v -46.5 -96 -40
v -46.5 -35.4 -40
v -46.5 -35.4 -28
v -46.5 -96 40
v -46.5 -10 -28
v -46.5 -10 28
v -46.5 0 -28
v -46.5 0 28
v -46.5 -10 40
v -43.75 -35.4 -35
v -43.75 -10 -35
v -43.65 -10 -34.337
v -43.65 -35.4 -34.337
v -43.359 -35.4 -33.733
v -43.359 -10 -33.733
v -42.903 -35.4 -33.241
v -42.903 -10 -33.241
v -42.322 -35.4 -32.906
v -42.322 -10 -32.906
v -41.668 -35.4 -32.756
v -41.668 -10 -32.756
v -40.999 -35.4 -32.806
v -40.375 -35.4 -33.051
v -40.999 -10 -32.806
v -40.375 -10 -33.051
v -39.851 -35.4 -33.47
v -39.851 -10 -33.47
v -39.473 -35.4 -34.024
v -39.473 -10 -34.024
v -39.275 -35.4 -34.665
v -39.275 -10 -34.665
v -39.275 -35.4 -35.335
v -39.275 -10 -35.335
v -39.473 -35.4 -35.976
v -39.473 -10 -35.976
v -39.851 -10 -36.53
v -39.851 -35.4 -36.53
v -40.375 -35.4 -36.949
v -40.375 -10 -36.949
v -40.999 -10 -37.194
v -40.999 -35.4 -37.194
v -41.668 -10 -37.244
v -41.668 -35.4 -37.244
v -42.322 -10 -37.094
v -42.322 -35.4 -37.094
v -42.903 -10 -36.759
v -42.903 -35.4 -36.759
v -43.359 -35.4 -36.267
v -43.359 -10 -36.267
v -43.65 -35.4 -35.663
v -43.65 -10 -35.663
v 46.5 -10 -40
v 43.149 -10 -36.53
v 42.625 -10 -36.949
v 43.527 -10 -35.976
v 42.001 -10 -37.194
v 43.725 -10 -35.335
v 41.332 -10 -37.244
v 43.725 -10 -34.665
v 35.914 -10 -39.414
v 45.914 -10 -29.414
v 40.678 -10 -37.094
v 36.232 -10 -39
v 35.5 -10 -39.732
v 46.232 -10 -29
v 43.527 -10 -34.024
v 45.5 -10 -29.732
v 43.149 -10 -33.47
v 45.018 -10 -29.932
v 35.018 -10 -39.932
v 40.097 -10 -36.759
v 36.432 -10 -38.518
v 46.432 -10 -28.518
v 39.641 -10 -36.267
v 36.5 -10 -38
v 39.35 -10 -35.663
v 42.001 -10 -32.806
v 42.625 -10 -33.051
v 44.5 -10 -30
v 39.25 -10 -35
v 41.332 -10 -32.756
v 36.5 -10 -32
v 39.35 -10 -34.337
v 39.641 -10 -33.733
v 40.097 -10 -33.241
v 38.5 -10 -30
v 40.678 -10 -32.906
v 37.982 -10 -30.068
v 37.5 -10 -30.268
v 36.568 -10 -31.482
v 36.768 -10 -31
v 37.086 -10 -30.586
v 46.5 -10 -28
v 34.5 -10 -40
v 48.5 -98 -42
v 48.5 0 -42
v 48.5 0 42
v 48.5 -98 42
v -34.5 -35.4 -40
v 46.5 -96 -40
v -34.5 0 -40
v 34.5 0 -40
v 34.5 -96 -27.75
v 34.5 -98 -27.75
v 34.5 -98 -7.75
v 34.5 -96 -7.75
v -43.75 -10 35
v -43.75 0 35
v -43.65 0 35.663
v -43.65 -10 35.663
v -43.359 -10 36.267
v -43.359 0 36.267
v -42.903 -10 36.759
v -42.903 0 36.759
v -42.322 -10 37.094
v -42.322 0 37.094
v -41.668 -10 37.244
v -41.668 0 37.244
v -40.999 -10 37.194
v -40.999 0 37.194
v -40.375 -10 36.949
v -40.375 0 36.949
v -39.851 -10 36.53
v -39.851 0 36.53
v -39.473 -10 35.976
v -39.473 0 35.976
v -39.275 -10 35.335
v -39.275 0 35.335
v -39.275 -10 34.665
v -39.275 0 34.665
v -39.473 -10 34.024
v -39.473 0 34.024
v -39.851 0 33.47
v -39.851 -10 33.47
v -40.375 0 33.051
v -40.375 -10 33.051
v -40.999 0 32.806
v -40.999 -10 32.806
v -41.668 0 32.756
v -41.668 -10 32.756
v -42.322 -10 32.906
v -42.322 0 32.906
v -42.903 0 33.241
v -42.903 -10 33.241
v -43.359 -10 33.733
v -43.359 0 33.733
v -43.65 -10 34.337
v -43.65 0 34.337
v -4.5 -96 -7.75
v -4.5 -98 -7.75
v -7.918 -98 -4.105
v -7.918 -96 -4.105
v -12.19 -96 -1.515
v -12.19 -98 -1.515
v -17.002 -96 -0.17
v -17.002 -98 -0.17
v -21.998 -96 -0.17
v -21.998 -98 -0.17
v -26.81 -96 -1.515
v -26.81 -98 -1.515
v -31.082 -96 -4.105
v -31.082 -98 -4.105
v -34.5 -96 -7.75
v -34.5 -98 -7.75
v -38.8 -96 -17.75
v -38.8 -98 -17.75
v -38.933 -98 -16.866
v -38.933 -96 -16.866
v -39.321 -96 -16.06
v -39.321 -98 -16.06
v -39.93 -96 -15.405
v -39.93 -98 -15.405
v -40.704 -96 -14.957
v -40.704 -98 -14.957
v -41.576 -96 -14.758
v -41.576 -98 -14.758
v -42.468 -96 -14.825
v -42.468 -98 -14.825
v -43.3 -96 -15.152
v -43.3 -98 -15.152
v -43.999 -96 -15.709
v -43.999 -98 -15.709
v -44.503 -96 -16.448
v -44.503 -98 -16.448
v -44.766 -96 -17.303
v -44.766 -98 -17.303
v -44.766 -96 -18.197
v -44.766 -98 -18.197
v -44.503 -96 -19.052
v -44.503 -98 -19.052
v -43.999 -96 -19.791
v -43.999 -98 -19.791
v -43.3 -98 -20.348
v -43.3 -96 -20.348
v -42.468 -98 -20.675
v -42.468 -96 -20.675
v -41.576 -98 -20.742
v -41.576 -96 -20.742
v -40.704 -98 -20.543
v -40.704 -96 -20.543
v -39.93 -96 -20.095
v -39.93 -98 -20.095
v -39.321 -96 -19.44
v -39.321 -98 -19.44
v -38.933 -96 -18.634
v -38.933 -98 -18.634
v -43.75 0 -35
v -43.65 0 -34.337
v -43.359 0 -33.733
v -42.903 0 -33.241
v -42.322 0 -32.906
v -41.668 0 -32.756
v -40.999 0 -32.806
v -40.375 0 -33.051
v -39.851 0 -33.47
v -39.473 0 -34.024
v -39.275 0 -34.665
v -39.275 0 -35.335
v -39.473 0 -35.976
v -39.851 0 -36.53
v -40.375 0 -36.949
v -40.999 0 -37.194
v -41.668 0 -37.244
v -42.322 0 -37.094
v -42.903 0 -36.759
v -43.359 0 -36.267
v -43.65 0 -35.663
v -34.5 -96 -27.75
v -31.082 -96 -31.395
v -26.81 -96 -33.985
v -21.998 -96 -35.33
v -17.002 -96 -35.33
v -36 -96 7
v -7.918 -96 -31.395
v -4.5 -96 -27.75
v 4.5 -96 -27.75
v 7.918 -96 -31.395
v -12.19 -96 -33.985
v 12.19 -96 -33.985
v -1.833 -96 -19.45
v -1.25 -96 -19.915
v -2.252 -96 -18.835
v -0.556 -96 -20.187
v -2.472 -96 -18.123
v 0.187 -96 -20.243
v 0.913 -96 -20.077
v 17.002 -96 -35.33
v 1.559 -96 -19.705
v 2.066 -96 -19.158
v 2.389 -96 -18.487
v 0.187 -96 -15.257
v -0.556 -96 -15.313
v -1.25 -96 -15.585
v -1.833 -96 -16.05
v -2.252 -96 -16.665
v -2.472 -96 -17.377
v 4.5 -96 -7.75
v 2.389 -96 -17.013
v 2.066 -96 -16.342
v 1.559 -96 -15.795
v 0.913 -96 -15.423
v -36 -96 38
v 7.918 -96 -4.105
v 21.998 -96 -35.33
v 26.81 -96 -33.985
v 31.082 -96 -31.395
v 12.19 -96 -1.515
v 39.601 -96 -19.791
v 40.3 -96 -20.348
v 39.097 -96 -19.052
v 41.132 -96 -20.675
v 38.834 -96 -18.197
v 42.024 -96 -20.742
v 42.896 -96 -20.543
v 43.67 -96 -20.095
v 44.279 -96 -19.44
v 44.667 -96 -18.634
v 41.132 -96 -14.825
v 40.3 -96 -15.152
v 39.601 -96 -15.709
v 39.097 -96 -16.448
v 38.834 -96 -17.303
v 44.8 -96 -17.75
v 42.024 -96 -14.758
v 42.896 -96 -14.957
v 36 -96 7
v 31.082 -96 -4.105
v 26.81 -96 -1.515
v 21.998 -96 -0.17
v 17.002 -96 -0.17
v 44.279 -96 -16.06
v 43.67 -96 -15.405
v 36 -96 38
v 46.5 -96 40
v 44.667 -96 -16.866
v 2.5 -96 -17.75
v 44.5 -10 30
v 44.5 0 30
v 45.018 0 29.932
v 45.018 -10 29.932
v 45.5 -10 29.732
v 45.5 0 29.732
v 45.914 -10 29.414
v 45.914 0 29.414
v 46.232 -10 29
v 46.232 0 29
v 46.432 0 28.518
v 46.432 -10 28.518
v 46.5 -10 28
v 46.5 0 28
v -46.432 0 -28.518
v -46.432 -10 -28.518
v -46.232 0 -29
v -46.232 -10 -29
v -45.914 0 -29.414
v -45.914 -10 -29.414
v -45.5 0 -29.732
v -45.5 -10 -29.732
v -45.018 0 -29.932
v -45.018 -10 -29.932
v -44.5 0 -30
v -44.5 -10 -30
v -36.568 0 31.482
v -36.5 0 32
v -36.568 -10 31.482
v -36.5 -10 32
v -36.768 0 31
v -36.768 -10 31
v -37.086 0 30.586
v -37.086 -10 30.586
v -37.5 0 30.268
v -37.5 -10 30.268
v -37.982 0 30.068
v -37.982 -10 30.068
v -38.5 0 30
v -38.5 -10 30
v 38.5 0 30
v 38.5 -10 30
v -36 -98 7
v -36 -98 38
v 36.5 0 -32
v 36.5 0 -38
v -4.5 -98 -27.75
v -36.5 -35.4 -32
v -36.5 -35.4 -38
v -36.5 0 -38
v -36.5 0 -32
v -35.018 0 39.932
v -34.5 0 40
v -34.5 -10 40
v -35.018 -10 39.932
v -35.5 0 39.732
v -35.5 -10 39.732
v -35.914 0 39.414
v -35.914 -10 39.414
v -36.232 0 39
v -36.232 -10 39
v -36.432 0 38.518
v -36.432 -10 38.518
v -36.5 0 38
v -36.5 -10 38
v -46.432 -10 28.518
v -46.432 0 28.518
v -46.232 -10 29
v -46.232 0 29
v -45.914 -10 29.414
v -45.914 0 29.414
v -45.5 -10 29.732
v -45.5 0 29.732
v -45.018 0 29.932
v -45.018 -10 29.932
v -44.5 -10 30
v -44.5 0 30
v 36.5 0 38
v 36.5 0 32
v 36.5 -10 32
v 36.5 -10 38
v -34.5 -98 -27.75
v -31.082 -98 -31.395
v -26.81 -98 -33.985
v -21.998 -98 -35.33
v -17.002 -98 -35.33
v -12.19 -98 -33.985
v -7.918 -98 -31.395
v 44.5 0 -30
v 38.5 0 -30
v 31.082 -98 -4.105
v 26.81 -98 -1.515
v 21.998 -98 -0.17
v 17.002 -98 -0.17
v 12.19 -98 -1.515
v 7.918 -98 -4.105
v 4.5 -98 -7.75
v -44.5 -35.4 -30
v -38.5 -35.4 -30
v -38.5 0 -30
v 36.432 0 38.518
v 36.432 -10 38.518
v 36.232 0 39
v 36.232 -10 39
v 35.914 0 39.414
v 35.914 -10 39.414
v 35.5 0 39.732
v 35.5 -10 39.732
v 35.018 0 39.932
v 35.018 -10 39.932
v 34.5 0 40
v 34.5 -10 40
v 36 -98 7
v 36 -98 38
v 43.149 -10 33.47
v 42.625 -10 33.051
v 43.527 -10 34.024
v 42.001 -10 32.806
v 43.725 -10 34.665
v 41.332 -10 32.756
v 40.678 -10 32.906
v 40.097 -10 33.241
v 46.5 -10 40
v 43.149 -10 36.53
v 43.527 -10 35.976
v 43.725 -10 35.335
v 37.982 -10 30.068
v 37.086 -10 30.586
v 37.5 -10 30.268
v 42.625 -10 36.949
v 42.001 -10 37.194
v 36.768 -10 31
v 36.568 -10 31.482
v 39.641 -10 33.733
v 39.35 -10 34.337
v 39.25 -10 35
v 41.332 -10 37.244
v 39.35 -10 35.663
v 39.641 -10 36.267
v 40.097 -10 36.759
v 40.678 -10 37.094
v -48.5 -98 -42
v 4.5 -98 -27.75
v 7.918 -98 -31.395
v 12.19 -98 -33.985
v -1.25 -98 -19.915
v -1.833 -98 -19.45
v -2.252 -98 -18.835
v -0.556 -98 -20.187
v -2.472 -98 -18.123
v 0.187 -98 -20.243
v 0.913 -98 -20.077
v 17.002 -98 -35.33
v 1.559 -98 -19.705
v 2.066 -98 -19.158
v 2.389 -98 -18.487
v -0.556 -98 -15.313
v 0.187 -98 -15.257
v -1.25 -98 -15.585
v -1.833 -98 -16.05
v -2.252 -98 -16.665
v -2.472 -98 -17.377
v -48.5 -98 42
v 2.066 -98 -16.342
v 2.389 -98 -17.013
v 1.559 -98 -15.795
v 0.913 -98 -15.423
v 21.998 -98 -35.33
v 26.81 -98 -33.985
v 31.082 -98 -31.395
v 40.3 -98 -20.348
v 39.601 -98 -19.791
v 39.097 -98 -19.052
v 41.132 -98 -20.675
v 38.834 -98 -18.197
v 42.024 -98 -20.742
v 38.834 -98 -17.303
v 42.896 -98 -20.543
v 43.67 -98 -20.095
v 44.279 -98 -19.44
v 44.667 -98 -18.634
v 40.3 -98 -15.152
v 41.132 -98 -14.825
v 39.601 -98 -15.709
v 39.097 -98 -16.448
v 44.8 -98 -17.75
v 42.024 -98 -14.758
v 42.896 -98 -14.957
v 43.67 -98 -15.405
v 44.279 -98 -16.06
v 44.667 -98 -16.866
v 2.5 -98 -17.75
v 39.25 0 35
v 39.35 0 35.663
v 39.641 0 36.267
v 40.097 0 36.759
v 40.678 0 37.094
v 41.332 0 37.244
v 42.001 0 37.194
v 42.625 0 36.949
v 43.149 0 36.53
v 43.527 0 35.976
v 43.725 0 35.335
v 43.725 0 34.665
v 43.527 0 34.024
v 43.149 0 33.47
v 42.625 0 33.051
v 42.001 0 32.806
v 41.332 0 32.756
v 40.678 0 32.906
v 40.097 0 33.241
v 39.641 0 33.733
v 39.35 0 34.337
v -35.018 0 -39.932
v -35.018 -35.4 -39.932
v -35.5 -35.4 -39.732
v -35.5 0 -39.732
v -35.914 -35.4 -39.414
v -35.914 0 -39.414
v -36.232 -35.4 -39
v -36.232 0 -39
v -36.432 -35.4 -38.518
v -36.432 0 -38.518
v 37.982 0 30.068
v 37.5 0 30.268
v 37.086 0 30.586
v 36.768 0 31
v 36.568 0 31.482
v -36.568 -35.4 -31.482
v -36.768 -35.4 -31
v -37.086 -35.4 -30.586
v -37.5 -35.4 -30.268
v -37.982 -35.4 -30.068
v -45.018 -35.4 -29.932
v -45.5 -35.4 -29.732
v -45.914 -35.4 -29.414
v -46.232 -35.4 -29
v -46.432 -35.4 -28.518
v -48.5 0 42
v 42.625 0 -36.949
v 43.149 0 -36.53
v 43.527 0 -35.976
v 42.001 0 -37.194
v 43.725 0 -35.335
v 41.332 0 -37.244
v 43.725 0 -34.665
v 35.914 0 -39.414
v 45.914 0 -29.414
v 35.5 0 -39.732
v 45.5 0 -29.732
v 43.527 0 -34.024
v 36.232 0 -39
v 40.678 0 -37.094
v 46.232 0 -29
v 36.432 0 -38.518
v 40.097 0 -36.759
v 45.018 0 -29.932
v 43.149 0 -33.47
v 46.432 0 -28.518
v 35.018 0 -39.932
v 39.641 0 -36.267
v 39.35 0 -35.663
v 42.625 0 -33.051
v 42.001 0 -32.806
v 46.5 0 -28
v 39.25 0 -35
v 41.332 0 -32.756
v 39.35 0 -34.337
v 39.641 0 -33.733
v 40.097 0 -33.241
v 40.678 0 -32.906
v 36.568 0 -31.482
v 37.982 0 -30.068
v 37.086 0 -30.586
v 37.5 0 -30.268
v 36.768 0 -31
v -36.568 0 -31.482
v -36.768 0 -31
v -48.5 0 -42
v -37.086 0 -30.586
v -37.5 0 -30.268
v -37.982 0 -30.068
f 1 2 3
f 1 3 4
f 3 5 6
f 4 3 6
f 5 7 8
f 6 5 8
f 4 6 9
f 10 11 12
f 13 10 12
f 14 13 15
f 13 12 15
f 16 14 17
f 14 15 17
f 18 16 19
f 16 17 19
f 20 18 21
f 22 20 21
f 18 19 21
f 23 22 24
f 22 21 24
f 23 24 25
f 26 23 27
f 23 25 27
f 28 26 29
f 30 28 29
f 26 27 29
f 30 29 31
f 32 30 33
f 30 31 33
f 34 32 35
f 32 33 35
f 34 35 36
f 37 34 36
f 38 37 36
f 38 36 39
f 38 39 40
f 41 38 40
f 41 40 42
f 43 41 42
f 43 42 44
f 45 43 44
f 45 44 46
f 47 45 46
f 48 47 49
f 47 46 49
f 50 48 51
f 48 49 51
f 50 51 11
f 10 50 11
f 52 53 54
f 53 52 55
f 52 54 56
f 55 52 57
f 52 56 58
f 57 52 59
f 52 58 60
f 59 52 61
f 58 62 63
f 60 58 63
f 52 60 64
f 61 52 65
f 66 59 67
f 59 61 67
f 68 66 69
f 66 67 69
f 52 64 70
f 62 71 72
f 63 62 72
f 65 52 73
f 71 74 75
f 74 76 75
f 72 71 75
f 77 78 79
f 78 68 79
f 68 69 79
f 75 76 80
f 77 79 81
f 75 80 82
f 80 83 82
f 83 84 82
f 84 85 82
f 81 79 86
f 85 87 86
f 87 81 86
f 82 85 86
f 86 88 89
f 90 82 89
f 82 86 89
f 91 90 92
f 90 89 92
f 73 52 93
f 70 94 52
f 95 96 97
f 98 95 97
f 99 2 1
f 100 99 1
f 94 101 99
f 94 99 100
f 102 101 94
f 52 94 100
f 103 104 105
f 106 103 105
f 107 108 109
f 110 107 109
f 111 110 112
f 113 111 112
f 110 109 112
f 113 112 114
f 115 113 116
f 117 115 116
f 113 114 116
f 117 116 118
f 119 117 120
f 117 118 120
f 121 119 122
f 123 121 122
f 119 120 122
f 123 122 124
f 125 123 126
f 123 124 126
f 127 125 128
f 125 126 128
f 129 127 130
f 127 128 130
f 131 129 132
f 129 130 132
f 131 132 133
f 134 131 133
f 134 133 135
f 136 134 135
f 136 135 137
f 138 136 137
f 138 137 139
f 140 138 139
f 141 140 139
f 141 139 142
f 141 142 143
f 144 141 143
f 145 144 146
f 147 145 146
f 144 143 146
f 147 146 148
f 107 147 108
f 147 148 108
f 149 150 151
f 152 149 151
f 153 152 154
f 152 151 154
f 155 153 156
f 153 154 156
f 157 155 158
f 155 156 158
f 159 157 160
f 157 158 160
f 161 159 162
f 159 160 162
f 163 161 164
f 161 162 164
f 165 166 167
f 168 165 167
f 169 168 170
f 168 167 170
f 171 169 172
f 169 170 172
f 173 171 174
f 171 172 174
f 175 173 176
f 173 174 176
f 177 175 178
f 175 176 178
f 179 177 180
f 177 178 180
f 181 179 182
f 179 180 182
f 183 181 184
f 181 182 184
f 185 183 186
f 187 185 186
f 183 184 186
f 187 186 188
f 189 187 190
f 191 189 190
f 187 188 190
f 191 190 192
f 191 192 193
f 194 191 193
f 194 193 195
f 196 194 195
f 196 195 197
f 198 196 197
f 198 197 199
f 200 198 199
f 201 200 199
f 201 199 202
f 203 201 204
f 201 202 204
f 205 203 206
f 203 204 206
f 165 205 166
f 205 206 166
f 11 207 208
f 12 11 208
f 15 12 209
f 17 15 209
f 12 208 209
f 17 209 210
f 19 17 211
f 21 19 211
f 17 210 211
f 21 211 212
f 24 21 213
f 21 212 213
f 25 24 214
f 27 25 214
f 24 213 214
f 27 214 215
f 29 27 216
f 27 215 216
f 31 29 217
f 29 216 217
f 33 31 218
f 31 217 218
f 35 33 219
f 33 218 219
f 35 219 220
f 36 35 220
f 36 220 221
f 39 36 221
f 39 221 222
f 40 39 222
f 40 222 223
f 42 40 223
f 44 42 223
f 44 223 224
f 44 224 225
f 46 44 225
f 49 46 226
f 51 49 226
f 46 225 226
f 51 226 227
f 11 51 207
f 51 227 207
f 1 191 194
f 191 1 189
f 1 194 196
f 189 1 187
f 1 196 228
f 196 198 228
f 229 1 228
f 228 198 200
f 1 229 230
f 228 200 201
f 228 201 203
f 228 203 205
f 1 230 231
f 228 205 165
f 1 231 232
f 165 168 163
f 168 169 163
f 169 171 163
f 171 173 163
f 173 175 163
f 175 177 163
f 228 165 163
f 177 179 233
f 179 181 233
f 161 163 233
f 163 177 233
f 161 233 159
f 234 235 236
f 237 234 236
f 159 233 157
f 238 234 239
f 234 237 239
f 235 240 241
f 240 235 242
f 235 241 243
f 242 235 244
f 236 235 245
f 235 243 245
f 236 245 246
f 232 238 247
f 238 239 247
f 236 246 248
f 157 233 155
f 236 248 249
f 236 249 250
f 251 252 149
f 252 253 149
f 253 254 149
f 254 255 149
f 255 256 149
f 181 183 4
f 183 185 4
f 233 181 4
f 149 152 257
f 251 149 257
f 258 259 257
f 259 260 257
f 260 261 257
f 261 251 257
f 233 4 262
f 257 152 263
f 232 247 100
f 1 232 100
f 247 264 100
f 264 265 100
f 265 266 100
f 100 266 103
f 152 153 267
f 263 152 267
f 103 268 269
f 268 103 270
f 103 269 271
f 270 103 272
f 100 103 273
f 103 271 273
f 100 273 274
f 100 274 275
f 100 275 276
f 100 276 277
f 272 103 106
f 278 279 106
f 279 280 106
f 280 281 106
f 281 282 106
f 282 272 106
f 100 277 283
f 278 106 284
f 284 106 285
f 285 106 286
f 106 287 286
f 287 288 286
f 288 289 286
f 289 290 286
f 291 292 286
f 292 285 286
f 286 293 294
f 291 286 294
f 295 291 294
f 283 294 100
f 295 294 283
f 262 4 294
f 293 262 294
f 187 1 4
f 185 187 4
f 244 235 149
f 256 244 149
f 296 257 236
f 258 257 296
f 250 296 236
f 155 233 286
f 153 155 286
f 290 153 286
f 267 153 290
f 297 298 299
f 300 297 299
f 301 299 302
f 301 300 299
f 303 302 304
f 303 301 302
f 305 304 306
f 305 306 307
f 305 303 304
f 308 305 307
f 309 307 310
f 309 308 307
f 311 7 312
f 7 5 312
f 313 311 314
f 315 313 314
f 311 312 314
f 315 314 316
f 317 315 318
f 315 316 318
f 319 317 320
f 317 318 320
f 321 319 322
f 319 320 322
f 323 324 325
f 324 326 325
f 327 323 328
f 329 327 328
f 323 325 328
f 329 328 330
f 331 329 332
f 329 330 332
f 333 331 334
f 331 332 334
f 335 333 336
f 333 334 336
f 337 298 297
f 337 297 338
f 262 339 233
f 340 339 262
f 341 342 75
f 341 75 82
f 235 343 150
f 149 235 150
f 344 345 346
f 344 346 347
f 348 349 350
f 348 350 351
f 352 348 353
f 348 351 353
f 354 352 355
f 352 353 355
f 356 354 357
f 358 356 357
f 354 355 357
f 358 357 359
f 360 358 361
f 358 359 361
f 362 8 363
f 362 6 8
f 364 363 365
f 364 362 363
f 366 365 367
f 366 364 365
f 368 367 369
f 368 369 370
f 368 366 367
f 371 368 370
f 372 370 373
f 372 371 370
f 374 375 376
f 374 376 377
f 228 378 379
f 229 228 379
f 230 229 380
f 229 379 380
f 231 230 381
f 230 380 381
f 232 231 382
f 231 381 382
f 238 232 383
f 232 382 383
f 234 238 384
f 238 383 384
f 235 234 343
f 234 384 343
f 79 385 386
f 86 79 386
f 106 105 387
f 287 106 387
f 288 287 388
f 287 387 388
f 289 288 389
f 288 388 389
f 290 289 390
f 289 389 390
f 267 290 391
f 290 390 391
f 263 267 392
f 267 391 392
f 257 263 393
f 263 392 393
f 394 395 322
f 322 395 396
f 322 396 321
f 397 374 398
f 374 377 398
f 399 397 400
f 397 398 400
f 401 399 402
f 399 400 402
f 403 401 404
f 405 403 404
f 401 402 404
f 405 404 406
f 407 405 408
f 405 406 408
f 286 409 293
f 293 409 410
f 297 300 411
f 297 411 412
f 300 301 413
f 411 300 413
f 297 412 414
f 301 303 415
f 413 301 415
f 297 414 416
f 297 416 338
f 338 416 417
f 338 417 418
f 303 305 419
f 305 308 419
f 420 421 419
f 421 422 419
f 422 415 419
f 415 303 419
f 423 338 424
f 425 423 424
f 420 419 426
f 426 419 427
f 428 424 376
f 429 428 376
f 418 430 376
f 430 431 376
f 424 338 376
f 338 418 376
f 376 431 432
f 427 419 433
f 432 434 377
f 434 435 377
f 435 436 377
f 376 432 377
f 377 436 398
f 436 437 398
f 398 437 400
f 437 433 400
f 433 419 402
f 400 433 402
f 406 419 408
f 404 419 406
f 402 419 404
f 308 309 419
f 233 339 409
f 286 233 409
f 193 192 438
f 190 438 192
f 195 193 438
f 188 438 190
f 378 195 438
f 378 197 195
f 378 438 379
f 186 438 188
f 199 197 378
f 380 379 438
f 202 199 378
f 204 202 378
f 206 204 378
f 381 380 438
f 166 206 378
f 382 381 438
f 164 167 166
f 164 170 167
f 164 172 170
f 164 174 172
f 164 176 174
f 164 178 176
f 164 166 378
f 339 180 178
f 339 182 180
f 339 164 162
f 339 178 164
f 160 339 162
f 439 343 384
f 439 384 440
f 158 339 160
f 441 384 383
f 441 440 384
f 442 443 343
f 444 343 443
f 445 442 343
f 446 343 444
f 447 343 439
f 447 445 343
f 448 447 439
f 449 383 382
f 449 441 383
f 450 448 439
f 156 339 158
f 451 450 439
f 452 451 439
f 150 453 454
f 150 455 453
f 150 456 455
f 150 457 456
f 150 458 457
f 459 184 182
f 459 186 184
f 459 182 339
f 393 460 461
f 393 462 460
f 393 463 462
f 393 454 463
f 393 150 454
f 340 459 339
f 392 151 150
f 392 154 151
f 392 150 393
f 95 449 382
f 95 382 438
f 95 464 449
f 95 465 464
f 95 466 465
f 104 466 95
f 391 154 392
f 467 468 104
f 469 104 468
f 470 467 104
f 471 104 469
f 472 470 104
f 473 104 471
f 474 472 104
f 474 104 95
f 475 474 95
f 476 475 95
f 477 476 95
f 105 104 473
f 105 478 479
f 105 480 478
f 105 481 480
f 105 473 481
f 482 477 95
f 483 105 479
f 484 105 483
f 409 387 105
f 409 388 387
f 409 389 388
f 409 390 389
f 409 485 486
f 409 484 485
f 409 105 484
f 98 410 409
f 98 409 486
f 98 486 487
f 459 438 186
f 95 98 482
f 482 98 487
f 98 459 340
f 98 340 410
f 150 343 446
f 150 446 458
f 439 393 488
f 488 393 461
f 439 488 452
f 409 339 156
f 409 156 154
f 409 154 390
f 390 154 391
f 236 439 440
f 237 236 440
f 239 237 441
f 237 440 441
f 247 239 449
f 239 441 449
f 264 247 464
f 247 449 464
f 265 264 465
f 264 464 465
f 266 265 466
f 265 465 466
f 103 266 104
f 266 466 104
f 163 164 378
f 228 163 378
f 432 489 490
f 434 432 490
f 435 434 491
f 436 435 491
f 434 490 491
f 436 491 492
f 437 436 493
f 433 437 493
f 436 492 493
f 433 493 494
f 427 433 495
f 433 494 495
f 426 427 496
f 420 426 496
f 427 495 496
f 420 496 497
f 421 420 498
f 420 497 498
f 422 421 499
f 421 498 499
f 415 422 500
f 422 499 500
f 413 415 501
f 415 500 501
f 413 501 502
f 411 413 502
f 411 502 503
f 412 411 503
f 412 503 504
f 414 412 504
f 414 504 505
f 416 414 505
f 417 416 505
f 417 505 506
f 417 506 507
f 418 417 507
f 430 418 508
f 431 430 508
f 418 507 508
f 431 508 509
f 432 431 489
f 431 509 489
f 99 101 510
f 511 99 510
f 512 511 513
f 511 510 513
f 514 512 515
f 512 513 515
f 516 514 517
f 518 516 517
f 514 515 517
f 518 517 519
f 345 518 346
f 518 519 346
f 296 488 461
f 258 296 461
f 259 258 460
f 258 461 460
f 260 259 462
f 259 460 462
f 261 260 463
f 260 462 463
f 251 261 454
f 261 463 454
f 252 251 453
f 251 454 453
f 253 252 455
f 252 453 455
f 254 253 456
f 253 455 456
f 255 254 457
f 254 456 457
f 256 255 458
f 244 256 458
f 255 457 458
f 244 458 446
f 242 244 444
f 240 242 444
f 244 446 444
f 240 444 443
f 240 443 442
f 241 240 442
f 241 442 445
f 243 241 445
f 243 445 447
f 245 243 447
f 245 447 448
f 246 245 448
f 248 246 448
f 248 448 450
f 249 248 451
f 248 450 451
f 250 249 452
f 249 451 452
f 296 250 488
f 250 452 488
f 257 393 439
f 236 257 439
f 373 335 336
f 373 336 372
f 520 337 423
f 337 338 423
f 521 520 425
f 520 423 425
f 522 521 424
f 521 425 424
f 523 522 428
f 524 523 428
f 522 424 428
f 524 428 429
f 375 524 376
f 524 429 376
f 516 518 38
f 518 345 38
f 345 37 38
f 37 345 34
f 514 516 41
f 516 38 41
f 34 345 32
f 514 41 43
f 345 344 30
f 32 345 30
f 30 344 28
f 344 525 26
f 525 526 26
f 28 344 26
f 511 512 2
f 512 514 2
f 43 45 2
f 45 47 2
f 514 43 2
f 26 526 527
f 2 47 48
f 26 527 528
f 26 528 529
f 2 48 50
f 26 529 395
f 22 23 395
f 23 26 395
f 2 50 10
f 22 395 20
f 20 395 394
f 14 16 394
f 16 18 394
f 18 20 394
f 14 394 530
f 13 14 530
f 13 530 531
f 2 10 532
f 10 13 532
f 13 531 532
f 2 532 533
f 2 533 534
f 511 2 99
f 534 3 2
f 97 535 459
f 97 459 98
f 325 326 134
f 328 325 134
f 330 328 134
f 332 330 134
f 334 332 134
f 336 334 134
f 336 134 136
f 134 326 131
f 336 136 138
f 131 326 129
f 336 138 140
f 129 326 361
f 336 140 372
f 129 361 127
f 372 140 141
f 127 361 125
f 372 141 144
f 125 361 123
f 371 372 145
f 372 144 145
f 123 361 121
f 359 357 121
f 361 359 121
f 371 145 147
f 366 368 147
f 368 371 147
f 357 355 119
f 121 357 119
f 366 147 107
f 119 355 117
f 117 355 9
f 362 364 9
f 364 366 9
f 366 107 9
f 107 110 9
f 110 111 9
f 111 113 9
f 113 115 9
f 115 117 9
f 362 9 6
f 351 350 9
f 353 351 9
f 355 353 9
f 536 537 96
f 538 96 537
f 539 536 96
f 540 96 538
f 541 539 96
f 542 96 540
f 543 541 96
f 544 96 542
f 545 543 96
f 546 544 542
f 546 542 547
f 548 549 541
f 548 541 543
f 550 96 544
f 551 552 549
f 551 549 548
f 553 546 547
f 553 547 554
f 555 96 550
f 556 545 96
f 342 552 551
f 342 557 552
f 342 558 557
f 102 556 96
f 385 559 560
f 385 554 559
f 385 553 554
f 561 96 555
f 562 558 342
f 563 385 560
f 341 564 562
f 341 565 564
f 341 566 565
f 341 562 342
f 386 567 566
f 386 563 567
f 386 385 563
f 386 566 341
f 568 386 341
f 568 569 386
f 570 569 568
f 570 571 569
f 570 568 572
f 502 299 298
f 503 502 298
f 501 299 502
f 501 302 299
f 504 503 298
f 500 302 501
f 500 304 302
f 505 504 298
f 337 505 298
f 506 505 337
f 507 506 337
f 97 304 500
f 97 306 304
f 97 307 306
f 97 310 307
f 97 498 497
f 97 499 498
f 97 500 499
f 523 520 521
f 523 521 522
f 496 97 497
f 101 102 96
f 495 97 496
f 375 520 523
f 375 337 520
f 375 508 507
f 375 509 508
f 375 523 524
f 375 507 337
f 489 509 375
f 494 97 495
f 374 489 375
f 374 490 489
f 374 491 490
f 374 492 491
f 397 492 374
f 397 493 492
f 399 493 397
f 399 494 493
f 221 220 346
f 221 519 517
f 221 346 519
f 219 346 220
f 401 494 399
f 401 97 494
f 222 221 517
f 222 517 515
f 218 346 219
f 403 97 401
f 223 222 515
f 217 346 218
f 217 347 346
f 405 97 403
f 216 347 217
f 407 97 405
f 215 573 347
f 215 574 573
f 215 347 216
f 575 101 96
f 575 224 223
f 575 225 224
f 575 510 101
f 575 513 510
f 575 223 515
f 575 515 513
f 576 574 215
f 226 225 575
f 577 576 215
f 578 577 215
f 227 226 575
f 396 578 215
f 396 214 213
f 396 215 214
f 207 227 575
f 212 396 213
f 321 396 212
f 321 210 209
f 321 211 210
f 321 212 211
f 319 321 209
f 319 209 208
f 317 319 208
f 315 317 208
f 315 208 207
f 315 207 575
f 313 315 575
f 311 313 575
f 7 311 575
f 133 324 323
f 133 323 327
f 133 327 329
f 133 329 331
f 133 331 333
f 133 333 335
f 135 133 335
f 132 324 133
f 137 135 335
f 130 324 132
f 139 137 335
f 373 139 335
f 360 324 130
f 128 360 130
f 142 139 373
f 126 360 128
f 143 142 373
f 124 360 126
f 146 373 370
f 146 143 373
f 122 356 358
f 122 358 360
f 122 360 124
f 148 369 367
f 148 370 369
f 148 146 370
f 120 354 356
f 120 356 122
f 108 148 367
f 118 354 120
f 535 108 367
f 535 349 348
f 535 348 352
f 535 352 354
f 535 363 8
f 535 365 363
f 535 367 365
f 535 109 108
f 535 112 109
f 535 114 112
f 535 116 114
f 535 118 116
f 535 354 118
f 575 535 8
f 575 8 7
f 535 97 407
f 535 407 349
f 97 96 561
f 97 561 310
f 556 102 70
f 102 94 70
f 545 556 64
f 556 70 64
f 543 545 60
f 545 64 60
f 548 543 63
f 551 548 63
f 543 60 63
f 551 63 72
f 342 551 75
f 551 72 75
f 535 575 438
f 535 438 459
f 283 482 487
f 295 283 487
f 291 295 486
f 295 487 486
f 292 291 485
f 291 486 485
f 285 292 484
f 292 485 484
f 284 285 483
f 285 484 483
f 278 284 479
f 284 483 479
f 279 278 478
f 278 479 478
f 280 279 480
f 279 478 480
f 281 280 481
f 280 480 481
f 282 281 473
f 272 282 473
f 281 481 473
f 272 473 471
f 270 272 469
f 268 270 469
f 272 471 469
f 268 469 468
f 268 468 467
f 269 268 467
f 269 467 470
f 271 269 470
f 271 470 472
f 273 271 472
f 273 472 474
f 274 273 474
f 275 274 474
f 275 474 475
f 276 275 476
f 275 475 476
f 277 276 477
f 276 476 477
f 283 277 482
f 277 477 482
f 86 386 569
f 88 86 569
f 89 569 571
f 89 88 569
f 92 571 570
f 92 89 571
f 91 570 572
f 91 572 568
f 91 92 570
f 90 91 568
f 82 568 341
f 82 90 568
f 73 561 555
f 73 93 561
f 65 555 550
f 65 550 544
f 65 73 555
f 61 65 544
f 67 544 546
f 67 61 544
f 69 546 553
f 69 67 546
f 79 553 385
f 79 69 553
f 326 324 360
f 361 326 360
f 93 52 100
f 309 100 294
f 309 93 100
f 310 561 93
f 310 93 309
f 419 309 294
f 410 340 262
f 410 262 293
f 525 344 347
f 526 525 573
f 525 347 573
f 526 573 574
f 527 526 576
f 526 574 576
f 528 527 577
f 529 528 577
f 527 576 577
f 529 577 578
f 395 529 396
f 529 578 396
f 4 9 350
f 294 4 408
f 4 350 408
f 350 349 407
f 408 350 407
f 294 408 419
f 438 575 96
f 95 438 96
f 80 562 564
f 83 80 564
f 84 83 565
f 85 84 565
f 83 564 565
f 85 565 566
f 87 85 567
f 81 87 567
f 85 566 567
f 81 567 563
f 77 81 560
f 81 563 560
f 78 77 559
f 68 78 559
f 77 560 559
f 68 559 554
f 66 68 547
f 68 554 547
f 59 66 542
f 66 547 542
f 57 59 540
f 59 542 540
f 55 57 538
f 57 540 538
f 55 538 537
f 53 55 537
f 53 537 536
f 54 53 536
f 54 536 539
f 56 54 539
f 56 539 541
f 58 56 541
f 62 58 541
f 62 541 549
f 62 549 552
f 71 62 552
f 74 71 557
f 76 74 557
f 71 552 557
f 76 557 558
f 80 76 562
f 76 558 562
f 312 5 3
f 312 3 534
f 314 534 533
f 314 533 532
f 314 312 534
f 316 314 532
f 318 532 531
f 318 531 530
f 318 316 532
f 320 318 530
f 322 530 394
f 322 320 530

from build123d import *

# Parameters (mm, degrees)
F0_W     = 97
F0_H     = 84
F1_DEPTH = 98
F2_T     = -2
F3_W     = 72
F3_H     = 31
F3_R     = 2.5
F3_R_2   = 3
F4_DEPTH = 2
F5_W     = 10
F5_H     = 10
F5_R     = 2.25
F6_DEPTH = 10
F7_R     = 2
F8_DEPTH = 25.4


with BuildPart() as f1:
    # F0 (on Front) → F1 (new body)
    with BuildSketch(Plane.XZ):
        Rectangle(F0_W, F0_H)
    extrude(amount=F1_DEPTH)

    # F2
    f2_openings = [f1.faces().sort_by_distance(p)[0] for p in [
        (0, 0, 0),
    ]]
    offset(amount=F2_T, openings=f2_openings)

    # F3 (on face) → F4 (cut, through all)
    with BuildSketch(Plane.XZ.offset(98)):
        with BuildLine():
            ThreePointArc((-4.5, -7.75), (-19.5, 0), (-34.5, -7.75))
            Line((-34.5, -7.75), (-34.5, -27.75))
            ThreePointArc((-34.5, -27.75), (-19.5, -35.5), (-4.5, -27.75))
            Line((-4.5, -27.75), (-4.5, -7.75))
        make_face()
        with Locations((0, 22.5)):
            Rectangle(F3_W, F3_H)
        with BuildLine():
            Line((34.5, -27.75), (34.5, -7.75))
            ThreePointArc((34.5, -7.75), (19.5, 0), (4.5, -7.75))
            Line((4.5, -7.75), (4.5, -27.75))
            ThreePointArc((4.5, -27.75), (19.5, -35.5), (34.5, -27.75))
        make_face()
        with Locations((0, -17.75)):
            Circle(F3_R)
        with Locations((-41.8, -17.75)):
            Circle(F3_R_2)
        with Locations((41.8, -17.75)):
            Circle(F3_R_2)
    extrude(amount=-F4_DEPTH, mode=Mode.SUBTRACT)

    # F5 (on face) → F6 (join)
    with BuildSketch(Plane(origin=(0, 0, 0), x_dir=(-1, 0, 0), z_dir=(0, 1, 0))):
        with Locations((-41.5, 35)):
            Rectangle(F5_W, F5_H)
        with Locations((-41.5, 35)):
            Circle(F5_R, mode=Mode.SUBTRACT)
        with Locations((41.5, 35)):
            Rectangle(F5_W, F5_H)
        with Locations((41.5, 35)):
            Circle(F5_R, mode=Mode.SUBTRACT)
        with Locations((-41.5, -35)):
            Rectangle(F5_W, F5_H)
        with Locations((-41.5, -35)):
            Circle(F5_R, mode=Mode.SUBTRACT)
        with Locations((41.5, -35)):
            Rectangle(F5_W, F5_H)
        with Locations((41.5, -35)):
            Circle(F5_R, mode=Mode.SUBTRACT)
    extrude(amount=-F6_DEPTH)

    # F7
    f7_edges = [f1.edges().sort_by_distance(p)[0] for p in [
        (36.5, -5, 40),
        (46.5, -5, 30),
        (-36.5, -5, 40),
        (-46.5, -5, 30),
        (-36.5, -5, -40),
        (-46.5, -5, -30),
        (36.5, -5, -40),
        (46.5, -5, -30),
        (36.5, -5, 30),
        (36.5, -5, -30),
        (-36.5, -5, 30),
        (-36.5, -5, -30),
    ]]
    fillet(f7_edges, radius=F7_R)

    # F8 (add): a face of the model
    f8_faces = [f1.faces().sort_by_distance(p)[0] for p in [
        (-41.5, -10, -30.1697056275),
    ]]
    extrude(f8_faces, amount=F8_DEPTH)


solid = f1.part
